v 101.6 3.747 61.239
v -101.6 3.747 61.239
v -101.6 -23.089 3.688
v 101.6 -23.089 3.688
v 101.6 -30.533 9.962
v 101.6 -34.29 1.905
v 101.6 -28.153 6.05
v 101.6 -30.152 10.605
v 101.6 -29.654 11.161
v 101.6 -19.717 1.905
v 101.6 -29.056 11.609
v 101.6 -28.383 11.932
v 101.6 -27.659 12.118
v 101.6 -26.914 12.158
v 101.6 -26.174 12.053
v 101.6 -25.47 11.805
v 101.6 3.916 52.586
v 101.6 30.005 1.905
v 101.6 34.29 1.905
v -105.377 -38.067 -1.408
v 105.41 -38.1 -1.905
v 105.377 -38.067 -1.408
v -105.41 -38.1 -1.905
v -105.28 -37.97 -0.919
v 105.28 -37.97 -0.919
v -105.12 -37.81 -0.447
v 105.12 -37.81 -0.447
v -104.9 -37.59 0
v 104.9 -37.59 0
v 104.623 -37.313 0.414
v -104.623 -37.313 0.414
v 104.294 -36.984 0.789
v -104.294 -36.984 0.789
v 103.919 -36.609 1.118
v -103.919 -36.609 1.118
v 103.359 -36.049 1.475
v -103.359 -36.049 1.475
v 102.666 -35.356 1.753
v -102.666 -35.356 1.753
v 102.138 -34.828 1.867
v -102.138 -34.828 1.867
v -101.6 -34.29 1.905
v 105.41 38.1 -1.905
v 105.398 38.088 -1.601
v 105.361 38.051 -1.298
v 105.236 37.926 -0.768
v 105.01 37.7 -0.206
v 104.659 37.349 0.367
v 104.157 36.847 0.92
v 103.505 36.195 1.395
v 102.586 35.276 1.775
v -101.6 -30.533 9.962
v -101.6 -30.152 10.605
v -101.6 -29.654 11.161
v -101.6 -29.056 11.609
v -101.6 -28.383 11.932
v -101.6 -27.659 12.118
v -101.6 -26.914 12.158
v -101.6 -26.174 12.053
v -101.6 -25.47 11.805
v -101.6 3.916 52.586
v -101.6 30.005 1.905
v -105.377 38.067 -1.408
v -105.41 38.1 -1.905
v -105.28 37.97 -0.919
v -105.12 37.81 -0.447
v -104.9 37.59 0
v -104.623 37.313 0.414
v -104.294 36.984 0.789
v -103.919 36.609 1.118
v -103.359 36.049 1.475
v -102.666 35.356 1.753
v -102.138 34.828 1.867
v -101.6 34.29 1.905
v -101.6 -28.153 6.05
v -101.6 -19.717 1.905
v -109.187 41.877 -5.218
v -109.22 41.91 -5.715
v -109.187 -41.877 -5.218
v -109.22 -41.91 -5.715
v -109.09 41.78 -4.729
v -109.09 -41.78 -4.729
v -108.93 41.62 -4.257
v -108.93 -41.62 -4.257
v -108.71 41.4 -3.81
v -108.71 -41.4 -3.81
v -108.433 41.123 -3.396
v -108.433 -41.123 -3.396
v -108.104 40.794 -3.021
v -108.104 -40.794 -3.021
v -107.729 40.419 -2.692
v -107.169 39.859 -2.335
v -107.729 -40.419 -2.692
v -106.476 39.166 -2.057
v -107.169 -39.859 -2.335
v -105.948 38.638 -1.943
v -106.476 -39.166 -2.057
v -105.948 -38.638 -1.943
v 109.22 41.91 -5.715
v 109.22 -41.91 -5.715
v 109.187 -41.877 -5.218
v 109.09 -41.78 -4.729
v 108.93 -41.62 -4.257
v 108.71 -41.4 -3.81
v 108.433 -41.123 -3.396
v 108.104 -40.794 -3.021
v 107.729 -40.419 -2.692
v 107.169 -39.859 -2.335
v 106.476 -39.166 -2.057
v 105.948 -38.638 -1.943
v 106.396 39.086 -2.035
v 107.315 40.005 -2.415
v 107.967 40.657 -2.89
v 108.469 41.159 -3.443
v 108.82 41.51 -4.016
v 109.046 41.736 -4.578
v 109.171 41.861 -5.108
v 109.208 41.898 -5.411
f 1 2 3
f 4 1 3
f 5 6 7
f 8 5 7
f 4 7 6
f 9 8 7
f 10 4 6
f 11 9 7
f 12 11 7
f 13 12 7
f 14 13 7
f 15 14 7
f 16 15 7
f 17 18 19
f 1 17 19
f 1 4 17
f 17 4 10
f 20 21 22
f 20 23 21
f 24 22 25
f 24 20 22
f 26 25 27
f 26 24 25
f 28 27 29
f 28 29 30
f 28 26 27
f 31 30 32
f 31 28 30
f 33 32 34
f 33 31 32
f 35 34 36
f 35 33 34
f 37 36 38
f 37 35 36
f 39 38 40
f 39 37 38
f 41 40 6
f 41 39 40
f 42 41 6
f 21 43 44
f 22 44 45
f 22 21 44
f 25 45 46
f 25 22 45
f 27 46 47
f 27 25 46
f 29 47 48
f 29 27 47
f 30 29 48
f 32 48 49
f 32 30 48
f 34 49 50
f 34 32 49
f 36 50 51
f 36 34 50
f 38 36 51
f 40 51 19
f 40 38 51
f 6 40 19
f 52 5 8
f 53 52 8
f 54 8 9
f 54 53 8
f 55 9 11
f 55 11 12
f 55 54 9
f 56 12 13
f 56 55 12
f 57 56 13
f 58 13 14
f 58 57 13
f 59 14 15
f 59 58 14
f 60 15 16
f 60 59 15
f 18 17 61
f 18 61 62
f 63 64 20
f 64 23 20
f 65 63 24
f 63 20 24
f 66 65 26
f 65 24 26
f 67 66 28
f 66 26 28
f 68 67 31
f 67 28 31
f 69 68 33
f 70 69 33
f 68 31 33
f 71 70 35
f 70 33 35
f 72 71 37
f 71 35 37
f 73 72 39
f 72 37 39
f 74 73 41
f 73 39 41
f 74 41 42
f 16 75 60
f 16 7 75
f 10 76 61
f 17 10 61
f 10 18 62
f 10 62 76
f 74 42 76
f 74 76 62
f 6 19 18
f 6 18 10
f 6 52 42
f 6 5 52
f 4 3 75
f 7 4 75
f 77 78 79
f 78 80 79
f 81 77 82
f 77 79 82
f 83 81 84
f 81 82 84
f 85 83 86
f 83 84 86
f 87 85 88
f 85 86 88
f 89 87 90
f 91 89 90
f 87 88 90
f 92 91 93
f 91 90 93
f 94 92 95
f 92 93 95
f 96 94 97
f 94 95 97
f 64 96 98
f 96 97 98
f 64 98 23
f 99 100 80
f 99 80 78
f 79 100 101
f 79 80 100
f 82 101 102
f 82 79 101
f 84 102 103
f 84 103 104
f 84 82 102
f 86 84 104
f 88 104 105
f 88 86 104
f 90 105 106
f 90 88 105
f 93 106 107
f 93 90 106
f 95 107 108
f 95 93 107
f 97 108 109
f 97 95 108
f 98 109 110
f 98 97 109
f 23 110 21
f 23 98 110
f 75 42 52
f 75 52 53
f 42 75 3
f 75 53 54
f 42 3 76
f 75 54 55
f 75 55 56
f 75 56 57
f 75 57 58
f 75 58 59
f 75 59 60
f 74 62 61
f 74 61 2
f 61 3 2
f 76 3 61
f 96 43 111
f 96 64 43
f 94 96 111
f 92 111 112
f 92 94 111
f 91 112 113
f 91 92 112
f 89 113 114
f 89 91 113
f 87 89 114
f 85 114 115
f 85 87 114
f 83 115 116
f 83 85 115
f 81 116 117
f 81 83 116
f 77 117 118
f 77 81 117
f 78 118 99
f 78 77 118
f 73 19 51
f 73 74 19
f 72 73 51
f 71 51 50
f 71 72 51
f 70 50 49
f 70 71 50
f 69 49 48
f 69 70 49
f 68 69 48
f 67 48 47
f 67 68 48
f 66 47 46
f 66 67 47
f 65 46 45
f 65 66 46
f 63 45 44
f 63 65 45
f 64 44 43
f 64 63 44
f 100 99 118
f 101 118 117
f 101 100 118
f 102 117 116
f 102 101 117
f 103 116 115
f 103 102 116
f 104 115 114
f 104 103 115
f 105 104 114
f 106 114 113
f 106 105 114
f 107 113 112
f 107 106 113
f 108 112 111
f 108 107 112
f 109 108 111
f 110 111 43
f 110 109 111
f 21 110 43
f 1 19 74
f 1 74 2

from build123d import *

# Parameters (mm, degrees)
F1_DEPTH = 101.6
F2_DEPTH = 105.41
F3_R     = 3.80999
F4_R     = 3.80999
F5_DEPTH = 109.22
F6_R     = 3.80999


# Not quite as in the source:
# - a fillet or chamfer is up to 0.001 mm smaller than in the source, because OpenCascade refuses the exact size


with BuildPart() as f1:
    # F0 (on Right) → F1 (new body, symmetric)
    with BuildSketch(Plane.YZ):
        Polygon((-28.9227480759, 13.4151088954), (-34.29, 1.905), (-19.7165844463, 1.905), (3.9163465702, 52.5859841168), (30.004847431, 1.905), (34.29, 1.905), (3.7473661652, 61.2388325007), (-23.0888934554, 3.6882880238), (-28.1533413693, 6.0498788705), (-25.4697154073, 11.8049333181), align=None)
    extrude(amount=F1_DEPTH, both=True)

    # F0 (on Right) → F2 (join, symmetric)
    with BuildSketch(Plane.YZ):
        Polygon((-38.1, 1.905), (-38.1, -1.905), (38.1, -1.905), (38.1, 1.905), (34.29, 1.905), (30.004847431, 1.905), (-19.7165844463, 1.905), (-34.29, 1.905), align=None)
    extrude(amount=F2_DEPTH, both=True)

    # F3 (radius 3.81 in the source; OpenCascade refuses exactly that, so slightly less here)
    f3_edges = [f1.edges().sort_by_distance(p)[0] for p in [
        (-105.41, 0, 1.905),
        (0, -38.1, 1.905),
        (0, 38.1, 1.905),
        (105.41, 0, 1.905),
    ]]
    fillet(f3_edges, radius=F3_R)

    # F4 (radius 3.81 in the source; OpenCascade refuses exactly that, so slightly less here)
    f4_edges = [f1.edges().sort_by_distance(p)[0] for p in [
        (0, -28.922748, 13.415109),
    ]]
    fillet(f4_edges, radius=F4_R)

    # F0 (on Right) → F5 (join, symmetric)
    with BuildSketch(Plane.YZ):
        Polygon((38.1, -1.905), (-38.1, -1.905), (-41.91, -1.905), (-41.91, -5.715), (41.91, -5.715), (41.91, -1.905), align=None)
    extrude(amount=F5_DEPTH, both=True)

    # F6 (radius 3.81 in the source; OpenCascade refuses exactly that, so slightly less here)
    f6_edges = [f1.edges().sort_by_distance(p)[0] for p in [
        (-109.22, 0, -1.905),
        (0, 41.91, -1.905),
        (109.22, 0, -1.905),
        (0, -41.91, -1.905),
    ]]
    fillet(f6_edges, radius=F6_R)


solid = f1.part
